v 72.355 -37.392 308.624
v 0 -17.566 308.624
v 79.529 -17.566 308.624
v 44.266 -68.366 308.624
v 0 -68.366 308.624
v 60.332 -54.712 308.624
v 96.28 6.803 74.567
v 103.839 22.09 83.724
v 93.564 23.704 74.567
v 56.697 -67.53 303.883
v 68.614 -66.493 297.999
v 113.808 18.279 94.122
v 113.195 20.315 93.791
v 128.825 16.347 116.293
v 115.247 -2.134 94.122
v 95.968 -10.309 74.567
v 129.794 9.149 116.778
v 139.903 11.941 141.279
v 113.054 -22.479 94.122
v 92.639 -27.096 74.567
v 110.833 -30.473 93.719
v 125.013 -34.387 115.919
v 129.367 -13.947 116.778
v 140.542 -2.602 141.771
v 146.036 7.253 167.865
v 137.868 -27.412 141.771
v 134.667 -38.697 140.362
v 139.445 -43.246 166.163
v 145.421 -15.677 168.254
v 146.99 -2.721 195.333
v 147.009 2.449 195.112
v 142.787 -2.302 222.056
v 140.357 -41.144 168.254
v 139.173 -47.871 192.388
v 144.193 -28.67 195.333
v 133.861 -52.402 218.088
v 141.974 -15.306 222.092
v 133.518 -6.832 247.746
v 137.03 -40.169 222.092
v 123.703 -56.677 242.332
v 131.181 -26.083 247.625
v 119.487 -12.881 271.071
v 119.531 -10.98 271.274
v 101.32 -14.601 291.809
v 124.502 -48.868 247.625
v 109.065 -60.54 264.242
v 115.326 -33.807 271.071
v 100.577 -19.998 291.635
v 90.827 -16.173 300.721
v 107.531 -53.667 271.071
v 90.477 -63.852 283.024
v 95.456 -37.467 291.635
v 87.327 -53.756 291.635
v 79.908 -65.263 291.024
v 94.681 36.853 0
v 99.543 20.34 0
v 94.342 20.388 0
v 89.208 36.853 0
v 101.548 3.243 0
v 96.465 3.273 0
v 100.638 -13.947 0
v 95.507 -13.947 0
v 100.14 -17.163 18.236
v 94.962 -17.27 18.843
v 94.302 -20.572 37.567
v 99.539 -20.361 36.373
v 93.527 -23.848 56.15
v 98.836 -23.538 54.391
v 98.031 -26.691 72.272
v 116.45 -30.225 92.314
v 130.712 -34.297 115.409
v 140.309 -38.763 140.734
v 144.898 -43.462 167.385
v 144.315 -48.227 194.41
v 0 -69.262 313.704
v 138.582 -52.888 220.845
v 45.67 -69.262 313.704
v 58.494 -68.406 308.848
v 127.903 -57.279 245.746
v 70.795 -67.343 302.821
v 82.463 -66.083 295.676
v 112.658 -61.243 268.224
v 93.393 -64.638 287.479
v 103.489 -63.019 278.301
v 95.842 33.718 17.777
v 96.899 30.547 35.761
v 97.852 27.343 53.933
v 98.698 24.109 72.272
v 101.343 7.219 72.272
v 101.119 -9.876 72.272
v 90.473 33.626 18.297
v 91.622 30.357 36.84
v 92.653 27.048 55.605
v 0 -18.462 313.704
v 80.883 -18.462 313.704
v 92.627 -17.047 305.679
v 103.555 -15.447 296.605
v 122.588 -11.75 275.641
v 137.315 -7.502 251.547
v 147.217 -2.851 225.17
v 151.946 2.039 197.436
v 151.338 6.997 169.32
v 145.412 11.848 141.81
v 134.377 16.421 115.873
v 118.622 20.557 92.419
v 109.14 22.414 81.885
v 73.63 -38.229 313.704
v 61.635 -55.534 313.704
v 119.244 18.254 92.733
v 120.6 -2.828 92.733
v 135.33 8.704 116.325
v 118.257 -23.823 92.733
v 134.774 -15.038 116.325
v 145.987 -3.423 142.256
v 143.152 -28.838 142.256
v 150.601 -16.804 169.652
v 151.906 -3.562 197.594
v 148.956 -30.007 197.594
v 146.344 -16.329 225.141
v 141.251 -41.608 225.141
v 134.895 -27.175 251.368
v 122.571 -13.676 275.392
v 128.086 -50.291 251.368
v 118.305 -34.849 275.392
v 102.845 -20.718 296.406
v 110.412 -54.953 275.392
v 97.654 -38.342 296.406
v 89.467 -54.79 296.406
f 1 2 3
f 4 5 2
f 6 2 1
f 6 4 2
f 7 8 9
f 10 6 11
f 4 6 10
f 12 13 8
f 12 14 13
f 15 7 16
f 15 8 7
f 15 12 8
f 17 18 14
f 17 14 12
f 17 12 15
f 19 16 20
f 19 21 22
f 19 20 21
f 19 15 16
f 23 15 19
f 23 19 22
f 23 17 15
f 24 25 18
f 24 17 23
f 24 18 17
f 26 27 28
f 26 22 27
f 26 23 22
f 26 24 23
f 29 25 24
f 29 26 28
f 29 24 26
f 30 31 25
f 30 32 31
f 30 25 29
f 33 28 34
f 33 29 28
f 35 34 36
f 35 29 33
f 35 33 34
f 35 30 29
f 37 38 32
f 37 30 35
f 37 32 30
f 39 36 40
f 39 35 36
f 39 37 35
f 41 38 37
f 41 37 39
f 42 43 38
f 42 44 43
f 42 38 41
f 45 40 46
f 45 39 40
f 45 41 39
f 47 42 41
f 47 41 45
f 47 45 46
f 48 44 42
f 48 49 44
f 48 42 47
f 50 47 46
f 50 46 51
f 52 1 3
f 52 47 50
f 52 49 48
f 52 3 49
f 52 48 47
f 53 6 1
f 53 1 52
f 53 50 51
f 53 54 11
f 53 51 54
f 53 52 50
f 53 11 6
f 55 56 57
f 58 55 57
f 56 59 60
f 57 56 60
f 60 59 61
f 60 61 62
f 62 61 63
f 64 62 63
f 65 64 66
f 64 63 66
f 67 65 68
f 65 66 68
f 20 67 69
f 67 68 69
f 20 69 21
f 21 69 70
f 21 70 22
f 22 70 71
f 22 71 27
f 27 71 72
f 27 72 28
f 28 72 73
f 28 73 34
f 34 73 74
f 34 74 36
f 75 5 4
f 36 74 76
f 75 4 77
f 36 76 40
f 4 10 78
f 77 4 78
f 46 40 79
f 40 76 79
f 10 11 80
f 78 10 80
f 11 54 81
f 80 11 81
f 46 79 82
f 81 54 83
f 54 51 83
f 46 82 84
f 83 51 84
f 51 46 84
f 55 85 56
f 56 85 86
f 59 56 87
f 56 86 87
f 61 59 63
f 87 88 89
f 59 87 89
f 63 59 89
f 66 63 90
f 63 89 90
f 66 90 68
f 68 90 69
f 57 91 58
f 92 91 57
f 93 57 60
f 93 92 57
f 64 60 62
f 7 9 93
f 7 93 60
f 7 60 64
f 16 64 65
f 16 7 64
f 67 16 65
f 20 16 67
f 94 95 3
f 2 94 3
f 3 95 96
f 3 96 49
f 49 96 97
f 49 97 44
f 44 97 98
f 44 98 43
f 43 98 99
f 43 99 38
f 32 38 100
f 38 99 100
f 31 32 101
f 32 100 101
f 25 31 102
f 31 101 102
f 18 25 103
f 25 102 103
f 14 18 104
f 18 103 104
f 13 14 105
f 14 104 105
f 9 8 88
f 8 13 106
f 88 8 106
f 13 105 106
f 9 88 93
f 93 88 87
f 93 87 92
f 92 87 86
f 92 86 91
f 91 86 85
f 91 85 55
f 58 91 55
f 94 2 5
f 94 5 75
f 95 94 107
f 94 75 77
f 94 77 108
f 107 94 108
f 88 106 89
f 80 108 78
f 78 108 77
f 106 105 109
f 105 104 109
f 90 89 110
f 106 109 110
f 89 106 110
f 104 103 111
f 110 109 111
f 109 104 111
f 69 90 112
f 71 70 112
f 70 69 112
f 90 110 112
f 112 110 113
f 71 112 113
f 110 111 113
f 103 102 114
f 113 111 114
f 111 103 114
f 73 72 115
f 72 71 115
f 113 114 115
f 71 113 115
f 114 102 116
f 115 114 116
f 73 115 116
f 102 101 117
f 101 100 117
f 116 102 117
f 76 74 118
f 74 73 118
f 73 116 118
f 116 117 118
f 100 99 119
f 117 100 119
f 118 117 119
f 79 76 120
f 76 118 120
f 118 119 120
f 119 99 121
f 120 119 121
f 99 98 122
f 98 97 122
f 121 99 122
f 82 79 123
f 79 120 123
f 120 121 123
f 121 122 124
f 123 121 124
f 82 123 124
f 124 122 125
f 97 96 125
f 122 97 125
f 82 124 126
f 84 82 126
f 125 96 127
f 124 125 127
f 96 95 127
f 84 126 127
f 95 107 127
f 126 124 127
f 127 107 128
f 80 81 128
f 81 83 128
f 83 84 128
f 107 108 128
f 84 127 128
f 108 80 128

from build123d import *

# Parameters (mm, degrees)
F2_T     = -5.08
F5_DEPTH = 381
F6_W     = 183.9755326509
F6_H     = 374.7007958591
F7_DEPTH = 127


with BuildPart() as f1:
    # F0 (on Front) → F1 (revolve)
    with BuildSketch(Plane.XZ):
        with BuildLine():
            Line((0, 313.7035369873), (0, 0))
            Line((0, 0), (101.6, 0))
            Line((101.6, 0), (101.6, 72.2721558975))
            ThreePointArc((101.6, 72.2721558975), (151.9479695741, 197.5936266182), (82.9633497091, 313.7035369873))
            Line((82.9633497091, 313.7035369873), (0, 313.7035369873))
        make_face()
    revolve(axis=Axis((0, 0, 156.8517684937), (0, 0, -1)))

    # F2
    f2_openings = [f1.faces().sort_by_distance(p)[0] for p in [
        (0, 0, 0),
    ]]
    offset(amount=F2_T, openings=f2_openings, kind=Kind.INTERSECTION)

    # F4 (on offset) → F5 (cut)
    with BuildSketch(Plane.YZ.offset(177.8)):
        Polygon((-168.2938635349, -20.8534449339), (-40.0775820017, -20.8534449339), (-22.5597055078, -49.5606735349), (48.4589897096, -49.5606735349), (62.606588006, -20.8534449339), (175.8424788713, -20.8534449339), (175.8424788713, 336.9438350201), (0, 336.9438350201), (-10.2703914278, 381.5792500973), (-100.4313006997, 381.5792500973), (-107.4867025018, 336.9438350201), (-168.2938635349, 336.9438350201), align=None)
        Polygon((-10.2703914278, -20.8534449339), (-73.3597055078, 336.9438350201), (-22.5597055078, 336.9438350201), (40.5296085722, -20.8534449339), align=None, mode=Mode.SUBTRACT)
    extrude(amount=-F5_DEPTH, mode=Mode.SUBTRACT)

    # F6 (on Front) → F7 (cut, symmetric)
    with BuildSketch(Plane.XZ):
        with Locations((-91.9877663255, 152.6896301657)):
            Rectangle(F6_W, F6_H)
    extrude(amount=F7_DEPTH, both=True, mode=Mode.SUBTRACT)


solid = f1.part
